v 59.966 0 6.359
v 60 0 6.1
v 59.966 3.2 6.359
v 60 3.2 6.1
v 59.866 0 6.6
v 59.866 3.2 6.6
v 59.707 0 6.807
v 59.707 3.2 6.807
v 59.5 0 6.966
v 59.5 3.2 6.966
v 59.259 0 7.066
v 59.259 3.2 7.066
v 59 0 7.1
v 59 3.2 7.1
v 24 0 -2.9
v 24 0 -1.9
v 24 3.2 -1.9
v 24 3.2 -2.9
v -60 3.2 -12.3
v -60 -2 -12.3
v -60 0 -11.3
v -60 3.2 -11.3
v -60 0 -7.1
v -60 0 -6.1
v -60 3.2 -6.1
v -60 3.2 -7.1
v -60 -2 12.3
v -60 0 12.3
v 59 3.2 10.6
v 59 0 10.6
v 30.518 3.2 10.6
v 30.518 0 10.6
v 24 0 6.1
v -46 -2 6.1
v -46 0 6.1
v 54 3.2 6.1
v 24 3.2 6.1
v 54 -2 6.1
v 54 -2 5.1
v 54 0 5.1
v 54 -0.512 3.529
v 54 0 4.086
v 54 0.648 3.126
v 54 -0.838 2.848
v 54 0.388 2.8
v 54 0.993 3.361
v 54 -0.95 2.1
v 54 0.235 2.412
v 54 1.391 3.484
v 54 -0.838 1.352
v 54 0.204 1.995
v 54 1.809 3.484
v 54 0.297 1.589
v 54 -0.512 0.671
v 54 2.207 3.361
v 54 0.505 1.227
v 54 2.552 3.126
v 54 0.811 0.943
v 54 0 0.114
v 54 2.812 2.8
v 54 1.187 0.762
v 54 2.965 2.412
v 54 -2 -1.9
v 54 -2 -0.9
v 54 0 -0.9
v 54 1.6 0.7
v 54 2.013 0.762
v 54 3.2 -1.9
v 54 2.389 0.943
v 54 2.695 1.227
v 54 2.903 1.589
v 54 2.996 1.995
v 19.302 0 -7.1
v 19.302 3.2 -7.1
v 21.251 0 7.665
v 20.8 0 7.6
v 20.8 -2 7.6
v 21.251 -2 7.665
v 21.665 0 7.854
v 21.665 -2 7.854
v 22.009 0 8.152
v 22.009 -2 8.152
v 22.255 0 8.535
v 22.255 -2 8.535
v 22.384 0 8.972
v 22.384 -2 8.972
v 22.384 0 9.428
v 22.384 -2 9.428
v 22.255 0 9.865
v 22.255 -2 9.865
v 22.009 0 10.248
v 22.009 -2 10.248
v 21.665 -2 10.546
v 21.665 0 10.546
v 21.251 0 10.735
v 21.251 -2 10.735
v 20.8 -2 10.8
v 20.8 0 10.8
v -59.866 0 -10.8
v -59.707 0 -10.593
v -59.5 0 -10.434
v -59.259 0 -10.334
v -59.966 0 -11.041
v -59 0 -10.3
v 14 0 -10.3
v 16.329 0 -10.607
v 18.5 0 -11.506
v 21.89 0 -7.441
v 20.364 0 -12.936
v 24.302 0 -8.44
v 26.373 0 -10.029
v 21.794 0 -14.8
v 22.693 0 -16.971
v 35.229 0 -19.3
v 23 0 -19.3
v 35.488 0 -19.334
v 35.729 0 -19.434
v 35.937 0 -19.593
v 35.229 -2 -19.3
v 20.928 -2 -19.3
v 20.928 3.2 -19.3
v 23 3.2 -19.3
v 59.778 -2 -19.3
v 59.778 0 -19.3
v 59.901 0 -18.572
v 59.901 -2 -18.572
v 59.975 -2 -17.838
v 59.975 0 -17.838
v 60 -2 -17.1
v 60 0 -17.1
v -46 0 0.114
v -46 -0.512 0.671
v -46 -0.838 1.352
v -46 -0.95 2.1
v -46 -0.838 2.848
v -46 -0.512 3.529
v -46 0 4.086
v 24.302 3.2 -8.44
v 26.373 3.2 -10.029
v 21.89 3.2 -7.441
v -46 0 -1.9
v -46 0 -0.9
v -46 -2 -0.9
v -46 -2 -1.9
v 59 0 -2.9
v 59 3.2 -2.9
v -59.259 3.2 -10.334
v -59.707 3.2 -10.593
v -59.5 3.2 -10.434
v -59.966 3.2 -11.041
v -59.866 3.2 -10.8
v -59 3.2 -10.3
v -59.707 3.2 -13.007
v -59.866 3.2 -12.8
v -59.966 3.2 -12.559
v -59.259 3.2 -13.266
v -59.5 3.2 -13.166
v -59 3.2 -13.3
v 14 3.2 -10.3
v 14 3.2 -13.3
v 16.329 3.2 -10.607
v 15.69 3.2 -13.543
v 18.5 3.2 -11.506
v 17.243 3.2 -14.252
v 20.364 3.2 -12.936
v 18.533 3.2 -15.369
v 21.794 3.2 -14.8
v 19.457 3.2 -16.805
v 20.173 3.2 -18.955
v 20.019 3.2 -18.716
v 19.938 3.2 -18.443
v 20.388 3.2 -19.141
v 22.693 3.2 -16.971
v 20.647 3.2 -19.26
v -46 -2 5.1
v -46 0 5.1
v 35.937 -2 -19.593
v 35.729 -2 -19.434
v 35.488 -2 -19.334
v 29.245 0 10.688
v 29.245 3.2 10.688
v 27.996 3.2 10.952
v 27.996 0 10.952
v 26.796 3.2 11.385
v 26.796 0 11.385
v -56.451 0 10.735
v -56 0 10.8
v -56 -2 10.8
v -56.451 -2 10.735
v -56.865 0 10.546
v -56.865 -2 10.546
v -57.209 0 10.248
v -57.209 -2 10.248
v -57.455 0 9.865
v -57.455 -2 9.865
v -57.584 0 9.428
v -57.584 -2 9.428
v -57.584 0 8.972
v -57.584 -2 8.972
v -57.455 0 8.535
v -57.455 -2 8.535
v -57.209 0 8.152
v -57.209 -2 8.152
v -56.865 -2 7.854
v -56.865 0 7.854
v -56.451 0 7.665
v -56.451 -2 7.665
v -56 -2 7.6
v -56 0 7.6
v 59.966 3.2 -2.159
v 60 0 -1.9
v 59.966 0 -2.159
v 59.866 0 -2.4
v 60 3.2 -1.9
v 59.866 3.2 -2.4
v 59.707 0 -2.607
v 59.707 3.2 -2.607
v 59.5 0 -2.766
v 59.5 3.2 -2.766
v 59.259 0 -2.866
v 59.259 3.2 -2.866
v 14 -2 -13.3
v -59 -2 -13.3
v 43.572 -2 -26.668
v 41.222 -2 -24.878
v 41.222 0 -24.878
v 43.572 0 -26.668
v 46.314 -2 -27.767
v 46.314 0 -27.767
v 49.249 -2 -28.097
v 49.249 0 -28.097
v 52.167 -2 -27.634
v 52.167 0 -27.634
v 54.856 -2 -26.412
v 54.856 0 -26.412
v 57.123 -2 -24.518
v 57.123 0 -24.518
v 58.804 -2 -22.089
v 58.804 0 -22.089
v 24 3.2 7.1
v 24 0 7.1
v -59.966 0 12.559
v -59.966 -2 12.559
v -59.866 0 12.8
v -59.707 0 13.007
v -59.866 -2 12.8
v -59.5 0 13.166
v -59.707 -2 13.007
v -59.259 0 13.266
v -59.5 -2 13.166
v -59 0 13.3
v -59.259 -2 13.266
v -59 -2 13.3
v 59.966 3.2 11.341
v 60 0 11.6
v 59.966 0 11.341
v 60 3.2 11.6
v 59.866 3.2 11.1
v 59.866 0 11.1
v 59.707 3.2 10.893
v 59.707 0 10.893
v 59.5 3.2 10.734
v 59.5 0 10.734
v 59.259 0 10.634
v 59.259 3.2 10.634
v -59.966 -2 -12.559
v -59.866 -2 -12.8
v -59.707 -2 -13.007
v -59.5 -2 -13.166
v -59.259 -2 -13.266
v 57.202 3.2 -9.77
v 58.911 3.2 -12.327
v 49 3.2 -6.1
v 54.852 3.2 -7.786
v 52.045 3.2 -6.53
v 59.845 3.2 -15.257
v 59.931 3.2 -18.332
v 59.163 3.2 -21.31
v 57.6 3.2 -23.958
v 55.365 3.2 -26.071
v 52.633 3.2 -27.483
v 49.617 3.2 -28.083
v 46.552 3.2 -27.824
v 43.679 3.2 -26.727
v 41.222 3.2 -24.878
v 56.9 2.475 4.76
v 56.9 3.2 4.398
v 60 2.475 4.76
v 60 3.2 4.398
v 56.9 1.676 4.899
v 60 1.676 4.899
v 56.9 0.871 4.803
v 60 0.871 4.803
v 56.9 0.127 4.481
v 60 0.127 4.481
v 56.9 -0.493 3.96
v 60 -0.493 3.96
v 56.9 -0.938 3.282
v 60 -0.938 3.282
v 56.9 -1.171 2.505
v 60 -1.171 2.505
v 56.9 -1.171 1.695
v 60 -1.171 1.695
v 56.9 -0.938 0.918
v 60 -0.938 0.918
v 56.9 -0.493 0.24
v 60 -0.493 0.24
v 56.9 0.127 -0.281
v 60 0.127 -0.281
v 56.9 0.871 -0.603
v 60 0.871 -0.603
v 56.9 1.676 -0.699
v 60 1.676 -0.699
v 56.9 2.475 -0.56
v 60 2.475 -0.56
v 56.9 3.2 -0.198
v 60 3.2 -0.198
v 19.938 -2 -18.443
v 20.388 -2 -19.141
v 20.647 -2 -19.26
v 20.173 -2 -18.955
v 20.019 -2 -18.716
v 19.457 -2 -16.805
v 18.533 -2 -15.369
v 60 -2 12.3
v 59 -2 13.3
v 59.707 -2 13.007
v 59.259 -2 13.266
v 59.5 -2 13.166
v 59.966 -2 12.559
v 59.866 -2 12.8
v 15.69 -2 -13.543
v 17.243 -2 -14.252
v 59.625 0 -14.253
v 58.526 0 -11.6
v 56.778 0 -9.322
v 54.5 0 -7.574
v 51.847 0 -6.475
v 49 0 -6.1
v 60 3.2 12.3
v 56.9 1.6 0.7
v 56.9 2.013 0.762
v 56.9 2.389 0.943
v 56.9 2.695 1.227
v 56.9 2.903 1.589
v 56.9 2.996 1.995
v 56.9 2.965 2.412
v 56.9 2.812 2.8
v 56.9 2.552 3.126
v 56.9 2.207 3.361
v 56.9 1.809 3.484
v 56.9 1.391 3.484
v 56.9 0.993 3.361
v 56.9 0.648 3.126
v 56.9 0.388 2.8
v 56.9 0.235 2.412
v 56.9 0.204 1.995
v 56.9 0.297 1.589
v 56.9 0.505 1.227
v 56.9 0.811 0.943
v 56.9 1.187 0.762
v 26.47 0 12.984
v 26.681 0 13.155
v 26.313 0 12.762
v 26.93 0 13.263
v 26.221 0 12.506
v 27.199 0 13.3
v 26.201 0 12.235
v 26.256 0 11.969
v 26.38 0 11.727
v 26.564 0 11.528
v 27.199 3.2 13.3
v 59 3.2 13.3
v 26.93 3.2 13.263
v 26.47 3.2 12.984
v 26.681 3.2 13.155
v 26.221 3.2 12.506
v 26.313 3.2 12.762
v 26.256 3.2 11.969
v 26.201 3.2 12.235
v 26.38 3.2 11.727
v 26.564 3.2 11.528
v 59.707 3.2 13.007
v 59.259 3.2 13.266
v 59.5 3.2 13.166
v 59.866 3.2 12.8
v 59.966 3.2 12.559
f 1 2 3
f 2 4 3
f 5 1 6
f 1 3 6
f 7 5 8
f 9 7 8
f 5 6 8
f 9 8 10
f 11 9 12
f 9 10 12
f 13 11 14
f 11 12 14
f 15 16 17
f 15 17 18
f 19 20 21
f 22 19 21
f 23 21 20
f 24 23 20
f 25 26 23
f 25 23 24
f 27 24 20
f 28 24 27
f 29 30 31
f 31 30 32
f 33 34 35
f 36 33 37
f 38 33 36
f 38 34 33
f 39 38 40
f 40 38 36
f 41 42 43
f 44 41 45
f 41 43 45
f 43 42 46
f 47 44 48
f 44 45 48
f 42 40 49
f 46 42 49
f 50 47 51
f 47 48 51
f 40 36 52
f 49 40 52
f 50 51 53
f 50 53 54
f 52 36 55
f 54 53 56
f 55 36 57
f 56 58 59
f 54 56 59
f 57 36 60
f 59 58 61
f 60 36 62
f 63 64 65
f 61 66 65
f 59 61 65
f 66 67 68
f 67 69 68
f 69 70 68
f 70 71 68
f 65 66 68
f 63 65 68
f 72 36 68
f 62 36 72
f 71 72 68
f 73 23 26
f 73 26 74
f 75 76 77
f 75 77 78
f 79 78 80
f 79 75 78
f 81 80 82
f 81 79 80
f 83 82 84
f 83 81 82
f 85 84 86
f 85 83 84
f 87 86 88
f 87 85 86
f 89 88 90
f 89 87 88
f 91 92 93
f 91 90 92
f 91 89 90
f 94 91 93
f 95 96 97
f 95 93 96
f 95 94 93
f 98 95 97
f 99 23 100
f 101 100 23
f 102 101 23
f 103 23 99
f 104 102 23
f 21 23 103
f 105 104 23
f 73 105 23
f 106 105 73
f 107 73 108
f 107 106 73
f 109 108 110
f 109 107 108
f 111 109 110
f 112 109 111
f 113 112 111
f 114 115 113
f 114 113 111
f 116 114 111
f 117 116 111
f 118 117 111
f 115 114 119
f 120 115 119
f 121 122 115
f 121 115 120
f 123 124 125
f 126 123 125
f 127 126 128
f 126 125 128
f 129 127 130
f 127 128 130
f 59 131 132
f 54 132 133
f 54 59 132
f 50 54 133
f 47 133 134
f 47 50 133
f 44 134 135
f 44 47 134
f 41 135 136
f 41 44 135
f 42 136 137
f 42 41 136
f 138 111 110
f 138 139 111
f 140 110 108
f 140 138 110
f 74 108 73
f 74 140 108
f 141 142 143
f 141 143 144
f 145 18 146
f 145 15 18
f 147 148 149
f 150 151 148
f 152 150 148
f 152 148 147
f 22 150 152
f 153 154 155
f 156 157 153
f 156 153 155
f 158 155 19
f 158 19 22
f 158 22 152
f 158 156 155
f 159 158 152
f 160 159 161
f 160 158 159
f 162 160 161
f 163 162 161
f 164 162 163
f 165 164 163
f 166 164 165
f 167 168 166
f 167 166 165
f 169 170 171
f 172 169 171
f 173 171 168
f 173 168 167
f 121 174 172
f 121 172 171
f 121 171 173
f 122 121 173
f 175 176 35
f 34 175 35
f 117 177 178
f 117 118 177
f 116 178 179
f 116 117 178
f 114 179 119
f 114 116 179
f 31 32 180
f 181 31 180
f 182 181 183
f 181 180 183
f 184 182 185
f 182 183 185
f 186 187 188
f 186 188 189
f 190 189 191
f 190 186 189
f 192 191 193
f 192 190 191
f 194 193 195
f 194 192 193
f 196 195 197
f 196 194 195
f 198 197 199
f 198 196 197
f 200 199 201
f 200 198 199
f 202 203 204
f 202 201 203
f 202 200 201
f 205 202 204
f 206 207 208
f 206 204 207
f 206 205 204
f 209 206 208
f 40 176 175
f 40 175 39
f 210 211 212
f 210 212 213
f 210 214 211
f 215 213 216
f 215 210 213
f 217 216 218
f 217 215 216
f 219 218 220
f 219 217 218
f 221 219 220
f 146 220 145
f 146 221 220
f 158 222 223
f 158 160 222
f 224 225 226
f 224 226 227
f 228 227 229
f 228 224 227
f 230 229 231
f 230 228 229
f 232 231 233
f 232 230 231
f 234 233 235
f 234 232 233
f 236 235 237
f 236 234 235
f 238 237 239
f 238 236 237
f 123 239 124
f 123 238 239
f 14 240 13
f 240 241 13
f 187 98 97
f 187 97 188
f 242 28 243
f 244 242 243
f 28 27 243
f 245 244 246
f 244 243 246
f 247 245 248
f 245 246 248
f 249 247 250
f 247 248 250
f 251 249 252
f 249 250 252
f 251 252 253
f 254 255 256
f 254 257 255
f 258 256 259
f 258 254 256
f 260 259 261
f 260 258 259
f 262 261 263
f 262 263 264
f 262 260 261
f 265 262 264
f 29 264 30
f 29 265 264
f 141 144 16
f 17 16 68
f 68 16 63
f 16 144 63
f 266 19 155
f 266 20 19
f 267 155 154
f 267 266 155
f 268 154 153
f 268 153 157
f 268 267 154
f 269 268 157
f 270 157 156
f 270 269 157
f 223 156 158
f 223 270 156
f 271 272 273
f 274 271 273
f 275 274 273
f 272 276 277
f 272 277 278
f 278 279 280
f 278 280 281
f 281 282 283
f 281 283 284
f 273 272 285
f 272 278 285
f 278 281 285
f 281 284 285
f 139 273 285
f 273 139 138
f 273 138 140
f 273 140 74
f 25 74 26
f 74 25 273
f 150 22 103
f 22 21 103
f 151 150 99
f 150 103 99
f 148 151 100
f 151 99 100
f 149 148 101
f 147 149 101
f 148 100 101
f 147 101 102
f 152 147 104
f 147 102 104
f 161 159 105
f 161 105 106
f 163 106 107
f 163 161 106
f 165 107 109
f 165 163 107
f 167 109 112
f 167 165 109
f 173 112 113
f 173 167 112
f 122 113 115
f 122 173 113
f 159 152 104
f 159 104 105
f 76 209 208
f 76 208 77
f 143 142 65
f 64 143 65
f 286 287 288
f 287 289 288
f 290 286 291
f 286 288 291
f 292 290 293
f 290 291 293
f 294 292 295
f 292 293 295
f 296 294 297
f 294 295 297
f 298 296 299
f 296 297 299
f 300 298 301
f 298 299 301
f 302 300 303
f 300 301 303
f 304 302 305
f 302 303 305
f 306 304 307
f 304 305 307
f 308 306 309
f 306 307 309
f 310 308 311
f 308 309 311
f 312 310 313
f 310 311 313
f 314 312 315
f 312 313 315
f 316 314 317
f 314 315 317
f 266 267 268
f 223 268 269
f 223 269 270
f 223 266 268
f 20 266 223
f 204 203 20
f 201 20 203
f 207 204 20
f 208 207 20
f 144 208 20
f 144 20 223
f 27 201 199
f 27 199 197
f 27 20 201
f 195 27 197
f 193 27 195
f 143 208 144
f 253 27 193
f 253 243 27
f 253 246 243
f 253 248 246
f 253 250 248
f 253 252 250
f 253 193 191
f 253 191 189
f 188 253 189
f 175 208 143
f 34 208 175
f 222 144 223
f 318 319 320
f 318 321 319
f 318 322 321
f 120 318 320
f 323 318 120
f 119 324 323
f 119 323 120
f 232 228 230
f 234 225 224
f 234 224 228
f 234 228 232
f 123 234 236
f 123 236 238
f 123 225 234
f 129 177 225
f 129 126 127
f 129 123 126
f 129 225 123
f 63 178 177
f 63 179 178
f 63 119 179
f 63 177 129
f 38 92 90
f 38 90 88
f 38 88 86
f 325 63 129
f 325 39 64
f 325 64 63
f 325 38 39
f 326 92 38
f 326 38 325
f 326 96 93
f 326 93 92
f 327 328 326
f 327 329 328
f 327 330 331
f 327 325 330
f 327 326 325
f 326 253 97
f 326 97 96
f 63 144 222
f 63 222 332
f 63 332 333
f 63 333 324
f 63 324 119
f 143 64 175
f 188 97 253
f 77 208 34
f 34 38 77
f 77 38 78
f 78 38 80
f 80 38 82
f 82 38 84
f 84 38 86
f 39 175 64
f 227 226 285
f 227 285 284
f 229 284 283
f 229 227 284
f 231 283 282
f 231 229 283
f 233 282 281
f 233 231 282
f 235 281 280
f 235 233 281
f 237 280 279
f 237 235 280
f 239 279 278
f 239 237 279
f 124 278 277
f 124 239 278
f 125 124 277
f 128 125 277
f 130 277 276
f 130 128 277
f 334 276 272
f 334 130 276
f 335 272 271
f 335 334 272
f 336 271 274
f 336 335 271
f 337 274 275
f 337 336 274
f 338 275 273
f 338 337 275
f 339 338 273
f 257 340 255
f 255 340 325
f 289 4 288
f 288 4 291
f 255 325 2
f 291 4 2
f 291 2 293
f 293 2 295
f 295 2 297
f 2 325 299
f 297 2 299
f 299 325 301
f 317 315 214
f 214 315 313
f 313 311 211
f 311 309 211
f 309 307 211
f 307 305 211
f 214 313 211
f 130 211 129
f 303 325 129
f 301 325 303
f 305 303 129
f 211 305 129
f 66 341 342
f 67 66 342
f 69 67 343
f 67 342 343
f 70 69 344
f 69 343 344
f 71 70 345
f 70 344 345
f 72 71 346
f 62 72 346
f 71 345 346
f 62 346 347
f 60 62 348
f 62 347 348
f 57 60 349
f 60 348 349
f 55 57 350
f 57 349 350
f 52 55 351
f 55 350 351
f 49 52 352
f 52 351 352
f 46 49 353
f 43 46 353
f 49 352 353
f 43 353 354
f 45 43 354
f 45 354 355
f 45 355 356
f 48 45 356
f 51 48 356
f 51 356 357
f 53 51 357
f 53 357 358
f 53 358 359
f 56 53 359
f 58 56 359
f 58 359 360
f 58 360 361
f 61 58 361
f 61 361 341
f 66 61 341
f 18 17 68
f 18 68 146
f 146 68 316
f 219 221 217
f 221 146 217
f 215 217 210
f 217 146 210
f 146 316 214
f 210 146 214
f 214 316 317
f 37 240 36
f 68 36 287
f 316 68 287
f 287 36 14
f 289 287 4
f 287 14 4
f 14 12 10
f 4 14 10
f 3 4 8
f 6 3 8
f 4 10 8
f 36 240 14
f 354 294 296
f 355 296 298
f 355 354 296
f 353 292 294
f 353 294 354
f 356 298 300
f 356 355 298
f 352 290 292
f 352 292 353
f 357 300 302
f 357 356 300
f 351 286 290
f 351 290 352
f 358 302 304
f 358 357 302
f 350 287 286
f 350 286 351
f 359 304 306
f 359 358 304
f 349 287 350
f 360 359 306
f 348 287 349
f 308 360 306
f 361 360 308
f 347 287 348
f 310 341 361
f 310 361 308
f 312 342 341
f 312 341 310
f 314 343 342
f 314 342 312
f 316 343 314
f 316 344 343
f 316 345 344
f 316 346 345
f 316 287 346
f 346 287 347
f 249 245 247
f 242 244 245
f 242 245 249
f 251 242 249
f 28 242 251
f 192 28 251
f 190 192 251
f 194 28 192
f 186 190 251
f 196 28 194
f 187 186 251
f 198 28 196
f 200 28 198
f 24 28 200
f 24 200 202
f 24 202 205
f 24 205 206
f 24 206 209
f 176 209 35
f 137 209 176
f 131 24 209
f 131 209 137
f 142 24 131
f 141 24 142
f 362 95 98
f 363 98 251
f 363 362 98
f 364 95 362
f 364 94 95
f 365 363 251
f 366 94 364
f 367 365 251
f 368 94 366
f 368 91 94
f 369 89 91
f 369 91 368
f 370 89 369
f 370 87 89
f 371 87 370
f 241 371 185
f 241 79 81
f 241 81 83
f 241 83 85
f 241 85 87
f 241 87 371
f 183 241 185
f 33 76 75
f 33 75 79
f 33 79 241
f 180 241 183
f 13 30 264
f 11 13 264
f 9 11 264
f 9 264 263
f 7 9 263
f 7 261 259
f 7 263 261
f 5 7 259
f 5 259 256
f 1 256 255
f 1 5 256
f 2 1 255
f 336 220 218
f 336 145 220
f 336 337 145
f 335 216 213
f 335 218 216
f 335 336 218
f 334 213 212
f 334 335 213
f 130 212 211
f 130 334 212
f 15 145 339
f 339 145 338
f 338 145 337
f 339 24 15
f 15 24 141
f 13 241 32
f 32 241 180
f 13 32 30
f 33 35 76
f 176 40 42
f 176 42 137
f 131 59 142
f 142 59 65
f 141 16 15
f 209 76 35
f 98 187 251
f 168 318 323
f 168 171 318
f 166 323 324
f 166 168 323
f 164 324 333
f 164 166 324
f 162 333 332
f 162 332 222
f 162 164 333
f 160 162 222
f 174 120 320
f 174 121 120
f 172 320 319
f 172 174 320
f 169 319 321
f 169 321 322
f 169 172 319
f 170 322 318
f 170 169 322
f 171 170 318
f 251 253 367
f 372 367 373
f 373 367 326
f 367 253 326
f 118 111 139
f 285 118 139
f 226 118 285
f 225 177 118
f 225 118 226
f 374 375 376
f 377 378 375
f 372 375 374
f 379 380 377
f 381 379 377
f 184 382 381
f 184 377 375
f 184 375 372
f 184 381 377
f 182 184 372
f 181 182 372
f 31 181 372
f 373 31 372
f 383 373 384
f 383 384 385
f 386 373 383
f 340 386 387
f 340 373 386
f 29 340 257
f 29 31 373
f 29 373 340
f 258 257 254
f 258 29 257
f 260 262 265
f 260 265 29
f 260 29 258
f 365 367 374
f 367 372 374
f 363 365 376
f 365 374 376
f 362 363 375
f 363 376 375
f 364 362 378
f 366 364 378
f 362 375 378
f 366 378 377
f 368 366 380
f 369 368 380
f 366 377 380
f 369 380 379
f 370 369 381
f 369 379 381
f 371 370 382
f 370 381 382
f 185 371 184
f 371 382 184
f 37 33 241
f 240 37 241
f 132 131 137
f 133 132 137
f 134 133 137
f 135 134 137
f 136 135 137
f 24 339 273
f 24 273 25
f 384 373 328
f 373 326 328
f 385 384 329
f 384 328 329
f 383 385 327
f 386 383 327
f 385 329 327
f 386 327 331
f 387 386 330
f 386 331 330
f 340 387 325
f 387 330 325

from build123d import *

# Parameters (mm, degrees)
BOSS_EXTRUDE2_DEPTH = 2
BOSS_EXTRUDE3_DEPTH = 3.2
BOSS_EXTRUDE4_START = 3.2
BOSS_EXTRUDE4_DEPTH = 3.2
SKETCH9_W           = 10
SKETCH9_H           = 3.2
BOSS_EXTRUDE5_DEPTH = 6
SKETCH8_R           = 2.8
CUT_EXTRUDE1_DEPTH  = 3.1
SKETCH10_R          = 1.4
CUT_EXTRUDE2_DEPTH  = 121.272440734
SKETCH11_R          = 2.55
CUT_EXTRUDE3_DEPTH  = 100
SKETCH12_W          = 30
SKETCH12_H          = 1
BOSS_EXTRUDE6_DEPTH = 3.2
SKETCH13_W          = 100
SKETCH13_H          = 1
CUT_EXTRUDE4_DEPTH  = 67.33136513
BOSS_EXTRUDE7_DEPTH = 3.2
CUT_EXTRUDE5_DEPTH  = 67.33136513
FILLET1_R           = 10
BOSS_EXTRUDE8_START = 2
BOSS_EXTRUDE8_DEPTH = 2
CUT_EXTRUDE6_DEPTH  = 67.33136513
FILLET2_R           = 1


with BuildPart() as part:
    # Sketch4 → Boss-Extrude2 (new body)
    with BuildSketch(Plane(origin=(0, 0, 0), x_dir=(1, 0, 0), z_dir=(0, 1, 0))):
        with BuildLine():
            Line((-60, -13.3), (60, -13.3))
            Line((60, -13.3), (60, 19.3))
            Line((60, 19.3), (20, 19.3))
            ThreePointArc((20, 19.3), (18.242640687, 15.057359313), (14, 13.3))
            Line((14, 13.3), (-60, 13.3))
            Line((-60, 13.3), (-60, -13.3))
        make_face()
    extrude(amount=-BOSS_EXTRUDE2_DEPTH)

    # Sketch5 → Boss-Extrude3 (add)
    with BuildSketch(Plane(origin=(0, 0, 0), x_dir=(1, 0, 0), z_dir=(0, 1, 0))):
        with BuildLine():
            Line((23.443650814, 7.1), (41.221825407, 24.878174593))
            ThreePointArc((41.221825407, 24.878174593), (59.162674858, 21.309517756), (49, 6.1))
            Line((49, 6.1), (-60, 6.1))
            Line((-60, 6.1), (-60, 7.1))
            Line((-60, 7.1), (23.443650814, 7.1))
        make_face()
    extrude(amount=BOSS_EXTRUDE3_DEPTH)

    # Sketch6 → Boss-Extrude4 (add)
    with BuildSketch(Plane(origin=(0, 0, 0), x_dir=(1, 0, 0), z_dir=(0, 1, 0)).offset(BOSS_EXTRUDE4_START)):
        with BuildLine():
            Line((-60, 10.3), (14, 10.3))
            ThreePointArc((14, 10.3), (20.363961031, 12.936038969), (23, 19.3))
            Line((23, 19.3), (20, 19.3))
            ThreePointArc((20, 19.3), (18.242640687, 15.057359313), (14, 13.3))
            Line((14, 13.3), (-60, 13.3))
            Line((-60, 13.3), (-60, 10.3))
        make_face()
    extrude(amount=-BOSS_EXTRUDE4_DEPTH)

    # Sketch9 → Boss-Extrude5 (add)
    with BuildSketch(Plane(origin=(60, 0, 0), x_dir=(0, 0, -1), z_dir=(1, 0, 0))):
        with Locations((-2.1, 1.6)):
            Rectangle(SKETCH9_W, SKETCH9_H)
    extrude(amount=-BOSS_EXTRUDE5_DEPTH)

    # Sketch8 → Cut-Extrude1 (cut)
    with BuildSketch(Plane(origin=(60, 0, 0), x_dir=(0, 0, -1), z_dir=(1, 0, 0))):
        with Locations((-2.1, 1.6)):
            Circle(SKETCH8_R)
    extrude(amount=-CUT_EXTRUDE1_DEPTH, mode=Mode.SUBTRACT)

    # Sketch10 → Cut-Extrude2 (cut, through all)
    with BuildSketch(Plane(origin=(56.9, 0, 0), x_dir=(0, 0, -1), z_dir=(1, 0, 0))):
        with Locations((-2.1, 1.6)):
            Circle(SKETCH10_R)
    extrude(amount=-CUT_EXTRUDE2_DEPTH, mode=Mode.SUBTRACT)

    # Sketch11 → Cut-Extrude3 (cut)
    with BuildSketch(Plane.ZY.offset(-54)):
        with Locations((2.1, 1.6)):
            Circle(SKETCH11_R)
    extrude(amount=CUT_EXTRUDE3_DEPTH, mode=Mode.SUBTRACT)

    # Sketch12 → Boss-Extrude6 (add)
    with BuildSketch(Plane(origin=(0, 0, 0), x_dir=(1, 0, 0), z_dir=(0, 1, 0))):
        with Locations((39, 2.4)):
            Rectangle(SKETCH12_W, SKETCH12_H)
    boss_extrude6 = extrude(amount=BOSS_EXTRUDE6_DEPTH)

    # Sketch13 → Cut-Extrude4 (cut, through all)
    with BuildSketch(Plane(origin=(0, 0, 0), x_dir=(1, 0, 0), z_dir=(0, 1, 0))):
        with Locations((4, 1.4)):
            Rectangle(SKETCH13_W, SKETCH13_H)
    cut_extrude4 = extrude(amount=-CUT_EXTRUDE4_DEPTH, mode=Mode.SUBTRACT)

    # Mirror1: Boss-Extrude6, Cut-Extrude4 across plane
    add(boss_extrude6.mirror(Plane.XY.offset(2.1)))
    add(cut_extrude4.mirror(Plane.XY.offset(2.1)), mode=Mode.SUBTRACT)

    # Sketch14 → Boss-Extrude7 (add)
    with BuildSketch(Plane(origin=(0, 0, 0), x_dir=(1, 0, 0), z_dir=(0, 1, 0))):
        with BuildLine():
            Line((60, -10.6), (30.518376618, -10.6))
            ThreePointArc((30.518376618, -10.6), (26.990656613, -11.301707138), (24, -13.3))
            Line((24, -13.3), (60, -13.3))
            Line((60, -13.3), (60, -10.6))
        make_face()
    extrude(amount=BOSS_EXTRUDE7_DEPTH)

    # Sketch15 → Cut-Extrude5 (cut, through all)
    with BuildSketch(Plane(origin=(0, 0, 0), x_dir=(1, 0, 0), z_dir=(0, 1, 0))):
        with BuildLine():
            Line((-56, -7.6), (20.8, -7.6))
            ThreePointArc((20.8, -7.6), (22.4, -9.2), (20.8, -10.8))
            Line((20.8, -10.8), (-56, -10.8))
            ThreePointArc((-56, -10.8), (-57.6, -9.2), (-56, -7.6))
        make_face()
    extrude(amount=-CUT_EXTRUDE5_DEPTH, mode=Mode.SUBTRACT)

    # Fillet1
    fillet1_edges = [part.edges().sort_by_distance(p)[0] for p in [
        (23.443650814, 1.6, -7.1),
    ]]
    fillet(fillet1_edges, radius=FILLET1_R)

    # Sketch16 → Boss-Extrude8 (add)
    with BuildSketch(Plane.XZ.offset(BOSS_EXTRUDE8_START)):
        with BuildLine():
            Line((59.777754868, -19.3), (35.643650814, -19.3))
            Line((35.643650814, -19.3), (41.221825407, -24.878174593))
            ThreePointArc((41.221825407, -24.878174593), (52.166761501, -27.634306887), (59.777754868, -19.3))
        make_face()
    extrude(amount=-BOSS_EXTRUDE8_DEPTH)

    # Sketch17 → Cut-Extrude6 (cut, through all)
    with BuildSketch(Plane(origin=(0, 0, 0), x_dir=(1, 0, 0), z_dir=(0, 1, 0))):
        with BuildLine():
            Line((60, 17.1), (60, 19.3))
            Line((60, 19.3), (59.777754868, 19.3))
            ThreePointArc((59.777754868, 19.3), (59.944297683, 18.205598582), (60, 17.1))
        make_face()
    extrude(amount=-CUT_EXTRUDE6_DEPTH, mode=Mode.SUBTRACT)

    # Fillet2
    fillet2_edges = [part.edges().sort_by_distance(p)[0] for p in [
        (-60, 0.6, -13.3),
        (20, 0.6, -19.3),
        (60, 0.6, 13.3),
        (-60, -1, 13.3),
        (60, 1.6, 10.6),
        (24, 1.6, 13.3),
        (35.643650814, -1, -19.3),
        (-60, 1.6, -10.3),
        (60, 1.6, -2.9),
        (60, 1.6, 7.1),
    ]]
    fillet(fillet2_edges, radius=FILLET2_R)


solid = part.part
